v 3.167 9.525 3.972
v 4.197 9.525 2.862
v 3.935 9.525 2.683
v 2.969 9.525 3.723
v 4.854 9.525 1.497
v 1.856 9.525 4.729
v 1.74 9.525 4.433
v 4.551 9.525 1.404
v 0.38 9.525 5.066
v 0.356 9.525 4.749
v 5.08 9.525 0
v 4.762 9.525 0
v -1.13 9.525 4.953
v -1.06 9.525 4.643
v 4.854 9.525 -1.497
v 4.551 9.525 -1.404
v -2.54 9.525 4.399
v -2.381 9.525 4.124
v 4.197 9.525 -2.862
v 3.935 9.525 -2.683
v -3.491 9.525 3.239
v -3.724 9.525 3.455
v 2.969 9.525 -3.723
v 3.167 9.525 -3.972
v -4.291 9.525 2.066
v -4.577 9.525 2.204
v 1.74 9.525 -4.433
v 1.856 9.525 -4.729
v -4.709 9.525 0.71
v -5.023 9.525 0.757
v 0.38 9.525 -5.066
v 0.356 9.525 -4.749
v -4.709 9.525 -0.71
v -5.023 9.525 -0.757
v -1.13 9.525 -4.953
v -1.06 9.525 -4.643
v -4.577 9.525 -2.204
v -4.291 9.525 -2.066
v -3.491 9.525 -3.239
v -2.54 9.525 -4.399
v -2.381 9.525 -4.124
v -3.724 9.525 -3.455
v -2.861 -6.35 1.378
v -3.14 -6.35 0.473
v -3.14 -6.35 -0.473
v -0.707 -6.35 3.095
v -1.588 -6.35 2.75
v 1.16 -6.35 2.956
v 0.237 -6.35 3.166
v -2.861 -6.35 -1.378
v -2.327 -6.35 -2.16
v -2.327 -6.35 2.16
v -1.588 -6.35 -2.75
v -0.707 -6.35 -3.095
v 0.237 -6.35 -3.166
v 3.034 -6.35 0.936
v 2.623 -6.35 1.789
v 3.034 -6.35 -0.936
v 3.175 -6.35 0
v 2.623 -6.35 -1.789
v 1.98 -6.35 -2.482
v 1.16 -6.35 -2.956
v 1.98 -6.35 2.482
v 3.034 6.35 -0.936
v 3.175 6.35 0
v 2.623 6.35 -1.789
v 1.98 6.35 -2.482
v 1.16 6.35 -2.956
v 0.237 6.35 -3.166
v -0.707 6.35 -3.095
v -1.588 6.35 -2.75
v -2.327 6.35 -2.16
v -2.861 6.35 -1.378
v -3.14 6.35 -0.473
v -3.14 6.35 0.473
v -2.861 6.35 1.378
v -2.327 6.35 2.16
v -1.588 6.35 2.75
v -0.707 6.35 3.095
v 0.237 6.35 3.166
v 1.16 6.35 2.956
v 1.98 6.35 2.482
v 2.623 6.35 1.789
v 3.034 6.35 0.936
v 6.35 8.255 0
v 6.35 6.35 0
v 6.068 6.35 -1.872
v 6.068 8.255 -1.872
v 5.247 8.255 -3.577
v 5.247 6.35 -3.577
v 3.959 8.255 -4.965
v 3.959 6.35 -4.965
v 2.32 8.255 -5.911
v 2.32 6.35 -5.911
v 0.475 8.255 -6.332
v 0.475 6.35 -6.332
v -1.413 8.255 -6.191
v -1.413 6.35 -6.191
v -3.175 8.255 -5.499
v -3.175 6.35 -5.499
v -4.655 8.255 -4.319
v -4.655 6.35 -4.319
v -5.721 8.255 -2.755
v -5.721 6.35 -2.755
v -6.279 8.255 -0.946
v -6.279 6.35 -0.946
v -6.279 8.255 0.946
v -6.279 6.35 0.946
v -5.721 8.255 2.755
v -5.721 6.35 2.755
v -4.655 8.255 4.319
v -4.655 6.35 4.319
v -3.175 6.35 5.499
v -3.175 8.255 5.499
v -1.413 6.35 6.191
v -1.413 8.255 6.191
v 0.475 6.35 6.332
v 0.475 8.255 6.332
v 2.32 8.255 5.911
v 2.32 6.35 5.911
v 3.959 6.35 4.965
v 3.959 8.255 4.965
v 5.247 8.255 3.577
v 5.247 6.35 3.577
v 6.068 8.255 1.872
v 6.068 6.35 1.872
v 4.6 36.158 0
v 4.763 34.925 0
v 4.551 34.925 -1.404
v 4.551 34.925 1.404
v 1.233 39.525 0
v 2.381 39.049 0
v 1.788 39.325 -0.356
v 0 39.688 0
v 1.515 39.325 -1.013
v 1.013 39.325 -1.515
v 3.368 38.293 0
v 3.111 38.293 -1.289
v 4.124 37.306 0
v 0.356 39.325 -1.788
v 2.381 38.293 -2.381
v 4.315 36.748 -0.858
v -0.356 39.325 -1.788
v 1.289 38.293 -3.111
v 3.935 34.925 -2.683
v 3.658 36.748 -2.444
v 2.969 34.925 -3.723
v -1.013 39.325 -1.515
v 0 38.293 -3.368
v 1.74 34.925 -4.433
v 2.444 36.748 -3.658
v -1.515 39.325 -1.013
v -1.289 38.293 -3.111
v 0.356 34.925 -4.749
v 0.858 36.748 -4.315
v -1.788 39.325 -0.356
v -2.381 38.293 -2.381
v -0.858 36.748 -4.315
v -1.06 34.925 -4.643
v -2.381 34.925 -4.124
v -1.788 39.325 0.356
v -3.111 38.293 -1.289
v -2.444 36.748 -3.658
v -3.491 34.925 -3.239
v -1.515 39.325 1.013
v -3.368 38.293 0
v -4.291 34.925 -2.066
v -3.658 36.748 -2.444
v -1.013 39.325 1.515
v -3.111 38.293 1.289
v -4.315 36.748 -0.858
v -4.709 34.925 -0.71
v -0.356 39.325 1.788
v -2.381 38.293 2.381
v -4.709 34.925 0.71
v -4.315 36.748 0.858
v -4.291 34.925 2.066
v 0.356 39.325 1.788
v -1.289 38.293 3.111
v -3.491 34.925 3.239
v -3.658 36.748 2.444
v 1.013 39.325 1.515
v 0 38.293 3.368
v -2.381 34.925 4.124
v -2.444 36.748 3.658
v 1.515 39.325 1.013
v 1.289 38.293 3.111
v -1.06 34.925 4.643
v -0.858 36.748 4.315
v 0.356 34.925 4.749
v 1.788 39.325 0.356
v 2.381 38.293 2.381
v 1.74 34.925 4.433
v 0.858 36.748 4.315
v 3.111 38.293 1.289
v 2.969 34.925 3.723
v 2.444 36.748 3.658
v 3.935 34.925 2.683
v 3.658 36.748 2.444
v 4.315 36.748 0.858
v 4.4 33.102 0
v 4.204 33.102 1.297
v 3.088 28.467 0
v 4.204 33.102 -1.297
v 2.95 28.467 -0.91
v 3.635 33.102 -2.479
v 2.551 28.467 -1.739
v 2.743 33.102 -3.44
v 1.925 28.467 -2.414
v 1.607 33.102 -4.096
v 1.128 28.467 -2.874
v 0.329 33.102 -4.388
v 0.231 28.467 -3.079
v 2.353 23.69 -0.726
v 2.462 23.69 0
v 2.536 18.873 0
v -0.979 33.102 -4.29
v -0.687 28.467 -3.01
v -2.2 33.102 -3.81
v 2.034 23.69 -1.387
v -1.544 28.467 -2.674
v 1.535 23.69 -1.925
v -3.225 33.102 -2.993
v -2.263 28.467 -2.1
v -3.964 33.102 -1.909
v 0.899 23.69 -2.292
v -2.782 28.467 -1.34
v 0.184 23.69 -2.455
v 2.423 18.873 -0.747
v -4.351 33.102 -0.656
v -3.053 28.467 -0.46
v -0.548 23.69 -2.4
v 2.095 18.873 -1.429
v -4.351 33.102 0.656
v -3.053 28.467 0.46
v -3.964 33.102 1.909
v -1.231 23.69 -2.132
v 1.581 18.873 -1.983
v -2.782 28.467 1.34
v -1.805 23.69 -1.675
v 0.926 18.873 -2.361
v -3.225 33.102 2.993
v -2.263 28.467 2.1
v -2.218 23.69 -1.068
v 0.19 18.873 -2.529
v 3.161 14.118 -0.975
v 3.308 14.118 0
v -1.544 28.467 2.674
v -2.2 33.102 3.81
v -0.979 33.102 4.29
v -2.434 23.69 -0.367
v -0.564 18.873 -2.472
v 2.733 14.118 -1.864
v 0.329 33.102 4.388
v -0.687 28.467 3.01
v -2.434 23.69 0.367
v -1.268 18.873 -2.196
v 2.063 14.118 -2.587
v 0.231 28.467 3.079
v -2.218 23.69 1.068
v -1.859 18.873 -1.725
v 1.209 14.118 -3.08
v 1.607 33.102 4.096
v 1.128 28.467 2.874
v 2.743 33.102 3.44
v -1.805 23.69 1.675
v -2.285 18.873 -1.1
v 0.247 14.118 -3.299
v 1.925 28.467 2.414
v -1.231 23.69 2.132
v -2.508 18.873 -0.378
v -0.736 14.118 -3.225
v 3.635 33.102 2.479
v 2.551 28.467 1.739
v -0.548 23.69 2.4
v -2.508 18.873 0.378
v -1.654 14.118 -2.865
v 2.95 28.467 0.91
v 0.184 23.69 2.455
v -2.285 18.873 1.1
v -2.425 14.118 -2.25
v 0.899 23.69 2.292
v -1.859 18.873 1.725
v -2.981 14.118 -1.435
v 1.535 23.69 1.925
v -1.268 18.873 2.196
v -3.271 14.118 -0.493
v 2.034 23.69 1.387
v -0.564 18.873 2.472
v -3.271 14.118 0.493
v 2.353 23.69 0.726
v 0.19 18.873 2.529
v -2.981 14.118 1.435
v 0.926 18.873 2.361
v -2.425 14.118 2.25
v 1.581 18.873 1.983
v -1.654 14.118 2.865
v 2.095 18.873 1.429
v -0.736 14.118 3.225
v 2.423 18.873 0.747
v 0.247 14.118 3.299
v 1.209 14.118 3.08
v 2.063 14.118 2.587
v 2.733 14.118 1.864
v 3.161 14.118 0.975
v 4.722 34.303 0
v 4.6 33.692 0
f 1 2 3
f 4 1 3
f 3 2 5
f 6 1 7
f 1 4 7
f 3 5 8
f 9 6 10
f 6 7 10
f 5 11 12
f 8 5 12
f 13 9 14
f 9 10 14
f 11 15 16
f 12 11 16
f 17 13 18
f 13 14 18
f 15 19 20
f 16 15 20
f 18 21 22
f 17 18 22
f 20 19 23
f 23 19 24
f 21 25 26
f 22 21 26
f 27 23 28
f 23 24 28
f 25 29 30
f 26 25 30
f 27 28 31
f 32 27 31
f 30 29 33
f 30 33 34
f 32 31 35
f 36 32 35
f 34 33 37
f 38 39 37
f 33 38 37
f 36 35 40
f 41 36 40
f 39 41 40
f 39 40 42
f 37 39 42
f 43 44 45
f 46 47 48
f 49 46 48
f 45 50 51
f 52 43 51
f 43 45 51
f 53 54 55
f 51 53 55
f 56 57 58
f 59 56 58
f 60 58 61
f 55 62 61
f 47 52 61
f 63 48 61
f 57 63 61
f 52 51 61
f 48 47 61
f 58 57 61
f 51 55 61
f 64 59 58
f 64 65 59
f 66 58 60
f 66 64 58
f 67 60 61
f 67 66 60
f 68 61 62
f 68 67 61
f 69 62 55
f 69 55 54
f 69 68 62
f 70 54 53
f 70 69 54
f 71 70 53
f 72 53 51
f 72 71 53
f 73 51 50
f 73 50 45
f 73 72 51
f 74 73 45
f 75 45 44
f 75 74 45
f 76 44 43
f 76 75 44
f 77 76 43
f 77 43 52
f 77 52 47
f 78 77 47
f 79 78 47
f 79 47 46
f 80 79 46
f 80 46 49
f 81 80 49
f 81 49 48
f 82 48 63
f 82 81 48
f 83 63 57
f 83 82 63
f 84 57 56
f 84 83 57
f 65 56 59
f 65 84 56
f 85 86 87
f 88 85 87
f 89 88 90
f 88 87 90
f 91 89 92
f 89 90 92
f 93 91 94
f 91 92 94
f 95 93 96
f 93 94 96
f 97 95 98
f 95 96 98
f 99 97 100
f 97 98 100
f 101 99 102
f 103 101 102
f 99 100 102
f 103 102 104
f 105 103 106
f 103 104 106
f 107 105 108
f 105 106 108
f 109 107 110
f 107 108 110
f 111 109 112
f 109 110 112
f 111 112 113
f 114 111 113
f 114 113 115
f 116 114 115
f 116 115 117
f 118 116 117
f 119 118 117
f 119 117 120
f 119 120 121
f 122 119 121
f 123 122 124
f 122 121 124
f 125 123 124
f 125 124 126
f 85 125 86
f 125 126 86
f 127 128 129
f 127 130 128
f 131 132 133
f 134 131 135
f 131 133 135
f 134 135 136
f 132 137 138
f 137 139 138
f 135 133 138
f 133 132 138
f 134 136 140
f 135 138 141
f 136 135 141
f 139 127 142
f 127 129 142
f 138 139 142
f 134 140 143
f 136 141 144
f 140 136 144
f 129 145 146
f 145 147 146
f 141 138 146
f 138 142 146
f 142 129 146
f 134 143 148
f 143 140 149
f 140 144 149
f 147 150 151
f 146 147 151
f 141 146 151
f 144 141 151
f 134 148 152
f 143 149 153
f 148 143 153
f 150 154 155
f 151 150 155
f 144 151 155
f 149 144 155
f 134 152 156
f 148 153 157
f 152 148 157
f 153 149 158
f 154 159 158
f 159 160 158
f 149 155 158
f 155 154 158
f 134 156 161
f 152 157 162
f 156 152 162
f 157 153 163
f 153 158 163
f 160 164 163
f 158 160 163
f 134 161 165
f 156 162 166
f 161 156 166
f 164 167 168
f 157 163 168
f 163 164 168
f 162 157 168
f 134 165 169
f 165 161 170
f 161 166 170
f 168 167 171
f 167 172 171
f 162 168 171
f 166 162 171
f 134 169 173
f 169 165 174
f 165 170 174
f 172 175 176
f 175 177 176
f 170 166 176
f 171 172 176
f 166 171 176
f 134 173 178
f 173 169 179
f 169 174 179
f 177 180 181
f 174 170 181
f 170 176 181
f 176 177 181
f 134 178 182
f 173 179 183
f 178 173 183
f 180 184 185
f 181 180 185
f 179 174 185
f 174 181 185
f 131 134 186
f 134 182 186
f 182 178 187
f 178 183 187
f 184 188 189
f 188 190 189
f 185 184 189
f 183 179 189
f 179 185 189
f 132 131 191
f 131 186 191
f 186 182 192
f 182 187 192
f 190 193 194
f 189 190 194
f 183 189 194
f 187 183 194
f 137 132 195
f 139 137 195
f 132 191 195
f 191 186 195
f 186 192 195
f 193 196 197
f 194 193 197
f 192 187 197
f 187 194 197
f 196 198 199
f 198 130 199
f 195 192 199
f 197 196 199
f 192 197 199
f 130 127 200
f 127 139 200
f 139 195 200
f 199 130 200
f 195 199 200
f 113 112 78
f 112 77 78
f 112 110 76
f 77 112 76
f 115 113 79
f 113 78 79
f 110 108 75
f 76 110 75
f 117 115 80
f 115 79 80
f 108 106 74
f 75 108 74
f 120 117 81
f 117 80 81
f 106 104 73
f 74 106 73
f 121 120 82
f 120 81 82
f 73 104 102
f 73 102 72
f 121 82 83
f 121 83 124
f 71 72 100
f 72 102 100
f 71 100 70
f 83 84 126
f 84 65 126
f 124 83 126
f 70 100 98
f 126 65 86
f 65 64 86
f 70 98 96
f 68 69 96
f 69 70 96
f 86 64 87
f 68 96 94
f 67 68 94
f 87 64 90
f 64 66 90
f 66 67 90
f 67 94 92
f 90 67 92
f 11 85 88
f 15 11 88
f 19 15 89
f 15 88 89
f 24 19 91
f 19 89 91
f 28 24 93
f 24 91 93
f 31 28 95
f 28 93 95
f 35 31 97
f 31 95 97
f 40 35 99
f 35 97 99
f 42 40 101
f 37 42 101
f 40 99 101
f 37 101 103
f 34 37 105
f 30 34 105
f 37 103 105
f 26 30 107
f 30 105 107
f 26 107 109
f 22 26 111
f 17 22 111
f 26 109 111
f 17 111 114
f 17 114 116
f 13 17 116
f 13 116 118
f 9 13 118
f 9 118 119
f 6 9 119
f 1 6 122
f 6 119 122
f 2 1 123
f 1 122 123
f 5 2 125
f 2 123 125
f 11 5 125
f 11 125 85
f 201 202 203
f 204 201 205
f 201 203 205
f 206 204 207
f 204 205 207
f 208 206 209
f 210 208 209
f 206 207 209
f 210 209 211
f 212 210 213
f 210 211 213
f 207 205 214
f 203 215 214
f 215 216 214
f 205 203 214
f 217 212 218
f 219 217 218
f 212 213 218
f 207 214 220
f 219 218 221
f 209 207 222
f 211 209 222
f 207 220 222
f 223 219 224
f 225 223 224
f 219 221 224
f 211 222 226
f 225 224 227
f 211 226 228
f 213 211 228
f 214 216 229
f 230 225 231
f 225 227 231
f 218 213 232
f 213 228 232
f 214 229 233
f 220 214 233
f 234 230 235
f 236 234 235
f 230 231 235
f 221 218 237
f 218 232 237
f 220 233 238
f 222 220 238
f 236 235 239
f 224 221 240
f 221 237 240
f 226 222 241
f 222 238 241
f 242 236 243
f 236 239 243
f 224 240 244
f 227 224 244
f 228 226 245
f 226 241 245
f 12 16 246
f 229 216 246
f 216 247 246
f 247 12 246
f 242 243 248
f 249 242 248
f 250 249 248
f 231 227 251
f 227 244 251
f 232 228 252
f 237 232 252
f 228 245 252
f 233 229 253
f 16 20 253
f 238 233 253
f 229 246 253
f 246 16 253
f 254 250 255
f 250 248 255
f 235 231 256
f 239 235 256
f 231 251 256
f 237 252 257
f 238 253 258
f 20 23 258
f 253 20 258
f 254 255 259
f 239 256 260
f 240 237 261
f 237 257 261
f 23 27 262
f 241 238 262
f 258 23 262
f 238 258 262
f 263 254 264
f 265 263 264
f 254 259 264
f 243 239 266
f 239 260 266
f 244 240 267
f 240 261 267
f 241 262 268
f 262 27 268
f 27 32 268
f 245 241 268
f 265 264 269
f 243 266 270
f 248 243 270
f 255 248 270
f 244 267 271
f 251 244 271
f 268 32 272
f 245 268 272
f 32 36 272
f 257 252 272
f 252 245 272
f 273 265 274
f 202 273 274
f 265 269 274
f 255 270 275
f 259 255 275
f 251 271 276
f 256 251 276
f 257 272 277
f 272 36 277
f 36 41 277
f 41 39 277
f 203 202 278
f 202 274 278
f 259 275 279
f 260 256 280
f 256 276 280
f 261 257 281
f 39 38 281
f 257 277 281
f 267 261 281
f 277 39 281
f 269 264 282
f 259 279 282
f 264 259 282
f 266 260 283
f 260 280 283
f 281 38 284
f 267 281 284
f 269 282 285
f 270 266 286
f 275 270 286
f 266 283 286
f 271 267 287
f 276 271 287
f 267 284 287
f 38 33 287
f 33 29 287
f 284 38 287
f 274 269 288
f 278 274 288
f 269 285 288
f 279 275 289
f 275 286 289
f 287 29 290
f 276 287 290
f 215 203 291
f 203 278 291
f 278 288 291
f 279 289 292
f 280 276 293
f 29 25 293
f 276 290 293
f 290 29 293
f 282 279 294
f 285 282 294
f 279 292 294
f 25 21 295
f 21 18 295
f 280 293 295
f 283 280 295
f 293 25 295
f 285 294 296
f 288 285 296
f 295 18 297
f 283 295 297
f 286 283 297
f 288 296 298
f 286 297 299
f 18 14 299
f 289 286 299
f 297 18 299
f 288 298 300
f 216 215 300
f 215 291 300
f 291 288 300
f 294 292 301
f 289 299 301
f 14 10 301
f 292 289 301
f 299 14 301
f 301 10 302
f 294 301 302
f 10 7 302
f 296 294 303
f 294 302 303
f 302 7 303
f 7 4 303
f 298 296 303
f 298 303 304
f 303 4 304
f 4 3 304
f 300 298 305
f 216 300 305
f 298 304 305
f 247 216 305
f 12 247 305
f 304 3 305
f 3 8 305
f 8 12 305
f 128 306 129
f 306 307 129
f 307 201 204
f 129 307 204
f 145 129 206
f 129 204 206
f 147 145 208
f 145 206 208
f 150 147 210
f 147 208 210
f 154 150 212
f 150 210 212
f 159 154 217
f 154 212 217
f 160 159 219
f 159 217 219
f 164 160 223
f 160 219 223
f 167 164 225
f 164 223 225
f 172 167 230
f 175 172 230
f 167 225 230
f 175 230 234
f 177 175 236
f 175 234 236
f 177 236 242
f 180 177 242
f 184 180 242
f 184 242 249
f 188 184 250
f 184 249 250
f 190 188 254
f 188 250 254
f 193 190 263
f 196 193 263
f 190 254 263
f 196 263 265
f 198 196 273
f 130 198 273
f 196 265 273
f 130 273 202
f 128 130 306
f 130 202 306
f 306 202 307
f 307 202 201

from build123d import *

# Parameters (mm, degrees)
SKETCH1_W     = 3.175
SKETCH1_H     = 12.7
CHAMFER1_SIZE = 1.27


with BuildPart() as part:
    # Sketch1 → Revolve1 (revolve)
    with BuildSketch(Plane.XY, mode=Mode.PRIVATE) as revolve1_sk:
        with BuildLine():
            ThreePointArc((-3.367596045, 31.557403955), (-1.822529847, 30.525023726), (0, 30.1625))
            Line((0, 30.1625), (0, 39.6875))
            ThreePointArc((0, 39.6875), (-3.367596045, 38.292596045), (-4.7625, 34.925))
            ThreePointArc((-4.7625, 34.925), (-4.670989898, 33.995882341), (-4.399976274, 33.102470153))
            ThreePointArc((-4.399976274, 33.102470153), (-3.959874029, 32.279096765), (-3.367596045, 31.557403955))
        make_face()
        with BuildLine():
            Line((-4.7625, 9.525), (0, 9.525))
            Line((0, 9.525), (0, 30.1625))
            ThreePointArc((0, 30.1625), (-1.822529847, 30.525023726), (-3.367596045, 31.557403955))
            ThreePointArc((-3.367596045, 31.557403955), (-3.959874029, 32.279096765), (-4.399976274, 33.102470153))
            ThreePointArc((-4.399976274, 33.102470153), (-2.411195624, 21.280368821), (-4.7625, 9.525))
        make_face()
        Polygon((-6.35, 6.35), (-3.175, 6.35), (0, 6.35), (0, 9.525), (-4.7625, 9.525), (-6.35, 9.525), align=None)
        with Locations((-1.5875, 0)):
            Rectangle(SKETCH1_W, SKETCH1_H)
    revolve(revolve1_sk.sketch.rotate(Axis((0, 45.924305238, 0), (0, 1, 0)), 180), axis=Axis((0, 45.924305238, 0), (0, 1, 0)))

    # Chamfer1
    chamfer1_edges = [part.edges().sort_by_distance(p)[0] for p in [
        (-6.35, 9.525, 0),
    ]]
    chamfer(chamfer1_edges, length=CHAMFER1_SIZE)


solid = part.part
